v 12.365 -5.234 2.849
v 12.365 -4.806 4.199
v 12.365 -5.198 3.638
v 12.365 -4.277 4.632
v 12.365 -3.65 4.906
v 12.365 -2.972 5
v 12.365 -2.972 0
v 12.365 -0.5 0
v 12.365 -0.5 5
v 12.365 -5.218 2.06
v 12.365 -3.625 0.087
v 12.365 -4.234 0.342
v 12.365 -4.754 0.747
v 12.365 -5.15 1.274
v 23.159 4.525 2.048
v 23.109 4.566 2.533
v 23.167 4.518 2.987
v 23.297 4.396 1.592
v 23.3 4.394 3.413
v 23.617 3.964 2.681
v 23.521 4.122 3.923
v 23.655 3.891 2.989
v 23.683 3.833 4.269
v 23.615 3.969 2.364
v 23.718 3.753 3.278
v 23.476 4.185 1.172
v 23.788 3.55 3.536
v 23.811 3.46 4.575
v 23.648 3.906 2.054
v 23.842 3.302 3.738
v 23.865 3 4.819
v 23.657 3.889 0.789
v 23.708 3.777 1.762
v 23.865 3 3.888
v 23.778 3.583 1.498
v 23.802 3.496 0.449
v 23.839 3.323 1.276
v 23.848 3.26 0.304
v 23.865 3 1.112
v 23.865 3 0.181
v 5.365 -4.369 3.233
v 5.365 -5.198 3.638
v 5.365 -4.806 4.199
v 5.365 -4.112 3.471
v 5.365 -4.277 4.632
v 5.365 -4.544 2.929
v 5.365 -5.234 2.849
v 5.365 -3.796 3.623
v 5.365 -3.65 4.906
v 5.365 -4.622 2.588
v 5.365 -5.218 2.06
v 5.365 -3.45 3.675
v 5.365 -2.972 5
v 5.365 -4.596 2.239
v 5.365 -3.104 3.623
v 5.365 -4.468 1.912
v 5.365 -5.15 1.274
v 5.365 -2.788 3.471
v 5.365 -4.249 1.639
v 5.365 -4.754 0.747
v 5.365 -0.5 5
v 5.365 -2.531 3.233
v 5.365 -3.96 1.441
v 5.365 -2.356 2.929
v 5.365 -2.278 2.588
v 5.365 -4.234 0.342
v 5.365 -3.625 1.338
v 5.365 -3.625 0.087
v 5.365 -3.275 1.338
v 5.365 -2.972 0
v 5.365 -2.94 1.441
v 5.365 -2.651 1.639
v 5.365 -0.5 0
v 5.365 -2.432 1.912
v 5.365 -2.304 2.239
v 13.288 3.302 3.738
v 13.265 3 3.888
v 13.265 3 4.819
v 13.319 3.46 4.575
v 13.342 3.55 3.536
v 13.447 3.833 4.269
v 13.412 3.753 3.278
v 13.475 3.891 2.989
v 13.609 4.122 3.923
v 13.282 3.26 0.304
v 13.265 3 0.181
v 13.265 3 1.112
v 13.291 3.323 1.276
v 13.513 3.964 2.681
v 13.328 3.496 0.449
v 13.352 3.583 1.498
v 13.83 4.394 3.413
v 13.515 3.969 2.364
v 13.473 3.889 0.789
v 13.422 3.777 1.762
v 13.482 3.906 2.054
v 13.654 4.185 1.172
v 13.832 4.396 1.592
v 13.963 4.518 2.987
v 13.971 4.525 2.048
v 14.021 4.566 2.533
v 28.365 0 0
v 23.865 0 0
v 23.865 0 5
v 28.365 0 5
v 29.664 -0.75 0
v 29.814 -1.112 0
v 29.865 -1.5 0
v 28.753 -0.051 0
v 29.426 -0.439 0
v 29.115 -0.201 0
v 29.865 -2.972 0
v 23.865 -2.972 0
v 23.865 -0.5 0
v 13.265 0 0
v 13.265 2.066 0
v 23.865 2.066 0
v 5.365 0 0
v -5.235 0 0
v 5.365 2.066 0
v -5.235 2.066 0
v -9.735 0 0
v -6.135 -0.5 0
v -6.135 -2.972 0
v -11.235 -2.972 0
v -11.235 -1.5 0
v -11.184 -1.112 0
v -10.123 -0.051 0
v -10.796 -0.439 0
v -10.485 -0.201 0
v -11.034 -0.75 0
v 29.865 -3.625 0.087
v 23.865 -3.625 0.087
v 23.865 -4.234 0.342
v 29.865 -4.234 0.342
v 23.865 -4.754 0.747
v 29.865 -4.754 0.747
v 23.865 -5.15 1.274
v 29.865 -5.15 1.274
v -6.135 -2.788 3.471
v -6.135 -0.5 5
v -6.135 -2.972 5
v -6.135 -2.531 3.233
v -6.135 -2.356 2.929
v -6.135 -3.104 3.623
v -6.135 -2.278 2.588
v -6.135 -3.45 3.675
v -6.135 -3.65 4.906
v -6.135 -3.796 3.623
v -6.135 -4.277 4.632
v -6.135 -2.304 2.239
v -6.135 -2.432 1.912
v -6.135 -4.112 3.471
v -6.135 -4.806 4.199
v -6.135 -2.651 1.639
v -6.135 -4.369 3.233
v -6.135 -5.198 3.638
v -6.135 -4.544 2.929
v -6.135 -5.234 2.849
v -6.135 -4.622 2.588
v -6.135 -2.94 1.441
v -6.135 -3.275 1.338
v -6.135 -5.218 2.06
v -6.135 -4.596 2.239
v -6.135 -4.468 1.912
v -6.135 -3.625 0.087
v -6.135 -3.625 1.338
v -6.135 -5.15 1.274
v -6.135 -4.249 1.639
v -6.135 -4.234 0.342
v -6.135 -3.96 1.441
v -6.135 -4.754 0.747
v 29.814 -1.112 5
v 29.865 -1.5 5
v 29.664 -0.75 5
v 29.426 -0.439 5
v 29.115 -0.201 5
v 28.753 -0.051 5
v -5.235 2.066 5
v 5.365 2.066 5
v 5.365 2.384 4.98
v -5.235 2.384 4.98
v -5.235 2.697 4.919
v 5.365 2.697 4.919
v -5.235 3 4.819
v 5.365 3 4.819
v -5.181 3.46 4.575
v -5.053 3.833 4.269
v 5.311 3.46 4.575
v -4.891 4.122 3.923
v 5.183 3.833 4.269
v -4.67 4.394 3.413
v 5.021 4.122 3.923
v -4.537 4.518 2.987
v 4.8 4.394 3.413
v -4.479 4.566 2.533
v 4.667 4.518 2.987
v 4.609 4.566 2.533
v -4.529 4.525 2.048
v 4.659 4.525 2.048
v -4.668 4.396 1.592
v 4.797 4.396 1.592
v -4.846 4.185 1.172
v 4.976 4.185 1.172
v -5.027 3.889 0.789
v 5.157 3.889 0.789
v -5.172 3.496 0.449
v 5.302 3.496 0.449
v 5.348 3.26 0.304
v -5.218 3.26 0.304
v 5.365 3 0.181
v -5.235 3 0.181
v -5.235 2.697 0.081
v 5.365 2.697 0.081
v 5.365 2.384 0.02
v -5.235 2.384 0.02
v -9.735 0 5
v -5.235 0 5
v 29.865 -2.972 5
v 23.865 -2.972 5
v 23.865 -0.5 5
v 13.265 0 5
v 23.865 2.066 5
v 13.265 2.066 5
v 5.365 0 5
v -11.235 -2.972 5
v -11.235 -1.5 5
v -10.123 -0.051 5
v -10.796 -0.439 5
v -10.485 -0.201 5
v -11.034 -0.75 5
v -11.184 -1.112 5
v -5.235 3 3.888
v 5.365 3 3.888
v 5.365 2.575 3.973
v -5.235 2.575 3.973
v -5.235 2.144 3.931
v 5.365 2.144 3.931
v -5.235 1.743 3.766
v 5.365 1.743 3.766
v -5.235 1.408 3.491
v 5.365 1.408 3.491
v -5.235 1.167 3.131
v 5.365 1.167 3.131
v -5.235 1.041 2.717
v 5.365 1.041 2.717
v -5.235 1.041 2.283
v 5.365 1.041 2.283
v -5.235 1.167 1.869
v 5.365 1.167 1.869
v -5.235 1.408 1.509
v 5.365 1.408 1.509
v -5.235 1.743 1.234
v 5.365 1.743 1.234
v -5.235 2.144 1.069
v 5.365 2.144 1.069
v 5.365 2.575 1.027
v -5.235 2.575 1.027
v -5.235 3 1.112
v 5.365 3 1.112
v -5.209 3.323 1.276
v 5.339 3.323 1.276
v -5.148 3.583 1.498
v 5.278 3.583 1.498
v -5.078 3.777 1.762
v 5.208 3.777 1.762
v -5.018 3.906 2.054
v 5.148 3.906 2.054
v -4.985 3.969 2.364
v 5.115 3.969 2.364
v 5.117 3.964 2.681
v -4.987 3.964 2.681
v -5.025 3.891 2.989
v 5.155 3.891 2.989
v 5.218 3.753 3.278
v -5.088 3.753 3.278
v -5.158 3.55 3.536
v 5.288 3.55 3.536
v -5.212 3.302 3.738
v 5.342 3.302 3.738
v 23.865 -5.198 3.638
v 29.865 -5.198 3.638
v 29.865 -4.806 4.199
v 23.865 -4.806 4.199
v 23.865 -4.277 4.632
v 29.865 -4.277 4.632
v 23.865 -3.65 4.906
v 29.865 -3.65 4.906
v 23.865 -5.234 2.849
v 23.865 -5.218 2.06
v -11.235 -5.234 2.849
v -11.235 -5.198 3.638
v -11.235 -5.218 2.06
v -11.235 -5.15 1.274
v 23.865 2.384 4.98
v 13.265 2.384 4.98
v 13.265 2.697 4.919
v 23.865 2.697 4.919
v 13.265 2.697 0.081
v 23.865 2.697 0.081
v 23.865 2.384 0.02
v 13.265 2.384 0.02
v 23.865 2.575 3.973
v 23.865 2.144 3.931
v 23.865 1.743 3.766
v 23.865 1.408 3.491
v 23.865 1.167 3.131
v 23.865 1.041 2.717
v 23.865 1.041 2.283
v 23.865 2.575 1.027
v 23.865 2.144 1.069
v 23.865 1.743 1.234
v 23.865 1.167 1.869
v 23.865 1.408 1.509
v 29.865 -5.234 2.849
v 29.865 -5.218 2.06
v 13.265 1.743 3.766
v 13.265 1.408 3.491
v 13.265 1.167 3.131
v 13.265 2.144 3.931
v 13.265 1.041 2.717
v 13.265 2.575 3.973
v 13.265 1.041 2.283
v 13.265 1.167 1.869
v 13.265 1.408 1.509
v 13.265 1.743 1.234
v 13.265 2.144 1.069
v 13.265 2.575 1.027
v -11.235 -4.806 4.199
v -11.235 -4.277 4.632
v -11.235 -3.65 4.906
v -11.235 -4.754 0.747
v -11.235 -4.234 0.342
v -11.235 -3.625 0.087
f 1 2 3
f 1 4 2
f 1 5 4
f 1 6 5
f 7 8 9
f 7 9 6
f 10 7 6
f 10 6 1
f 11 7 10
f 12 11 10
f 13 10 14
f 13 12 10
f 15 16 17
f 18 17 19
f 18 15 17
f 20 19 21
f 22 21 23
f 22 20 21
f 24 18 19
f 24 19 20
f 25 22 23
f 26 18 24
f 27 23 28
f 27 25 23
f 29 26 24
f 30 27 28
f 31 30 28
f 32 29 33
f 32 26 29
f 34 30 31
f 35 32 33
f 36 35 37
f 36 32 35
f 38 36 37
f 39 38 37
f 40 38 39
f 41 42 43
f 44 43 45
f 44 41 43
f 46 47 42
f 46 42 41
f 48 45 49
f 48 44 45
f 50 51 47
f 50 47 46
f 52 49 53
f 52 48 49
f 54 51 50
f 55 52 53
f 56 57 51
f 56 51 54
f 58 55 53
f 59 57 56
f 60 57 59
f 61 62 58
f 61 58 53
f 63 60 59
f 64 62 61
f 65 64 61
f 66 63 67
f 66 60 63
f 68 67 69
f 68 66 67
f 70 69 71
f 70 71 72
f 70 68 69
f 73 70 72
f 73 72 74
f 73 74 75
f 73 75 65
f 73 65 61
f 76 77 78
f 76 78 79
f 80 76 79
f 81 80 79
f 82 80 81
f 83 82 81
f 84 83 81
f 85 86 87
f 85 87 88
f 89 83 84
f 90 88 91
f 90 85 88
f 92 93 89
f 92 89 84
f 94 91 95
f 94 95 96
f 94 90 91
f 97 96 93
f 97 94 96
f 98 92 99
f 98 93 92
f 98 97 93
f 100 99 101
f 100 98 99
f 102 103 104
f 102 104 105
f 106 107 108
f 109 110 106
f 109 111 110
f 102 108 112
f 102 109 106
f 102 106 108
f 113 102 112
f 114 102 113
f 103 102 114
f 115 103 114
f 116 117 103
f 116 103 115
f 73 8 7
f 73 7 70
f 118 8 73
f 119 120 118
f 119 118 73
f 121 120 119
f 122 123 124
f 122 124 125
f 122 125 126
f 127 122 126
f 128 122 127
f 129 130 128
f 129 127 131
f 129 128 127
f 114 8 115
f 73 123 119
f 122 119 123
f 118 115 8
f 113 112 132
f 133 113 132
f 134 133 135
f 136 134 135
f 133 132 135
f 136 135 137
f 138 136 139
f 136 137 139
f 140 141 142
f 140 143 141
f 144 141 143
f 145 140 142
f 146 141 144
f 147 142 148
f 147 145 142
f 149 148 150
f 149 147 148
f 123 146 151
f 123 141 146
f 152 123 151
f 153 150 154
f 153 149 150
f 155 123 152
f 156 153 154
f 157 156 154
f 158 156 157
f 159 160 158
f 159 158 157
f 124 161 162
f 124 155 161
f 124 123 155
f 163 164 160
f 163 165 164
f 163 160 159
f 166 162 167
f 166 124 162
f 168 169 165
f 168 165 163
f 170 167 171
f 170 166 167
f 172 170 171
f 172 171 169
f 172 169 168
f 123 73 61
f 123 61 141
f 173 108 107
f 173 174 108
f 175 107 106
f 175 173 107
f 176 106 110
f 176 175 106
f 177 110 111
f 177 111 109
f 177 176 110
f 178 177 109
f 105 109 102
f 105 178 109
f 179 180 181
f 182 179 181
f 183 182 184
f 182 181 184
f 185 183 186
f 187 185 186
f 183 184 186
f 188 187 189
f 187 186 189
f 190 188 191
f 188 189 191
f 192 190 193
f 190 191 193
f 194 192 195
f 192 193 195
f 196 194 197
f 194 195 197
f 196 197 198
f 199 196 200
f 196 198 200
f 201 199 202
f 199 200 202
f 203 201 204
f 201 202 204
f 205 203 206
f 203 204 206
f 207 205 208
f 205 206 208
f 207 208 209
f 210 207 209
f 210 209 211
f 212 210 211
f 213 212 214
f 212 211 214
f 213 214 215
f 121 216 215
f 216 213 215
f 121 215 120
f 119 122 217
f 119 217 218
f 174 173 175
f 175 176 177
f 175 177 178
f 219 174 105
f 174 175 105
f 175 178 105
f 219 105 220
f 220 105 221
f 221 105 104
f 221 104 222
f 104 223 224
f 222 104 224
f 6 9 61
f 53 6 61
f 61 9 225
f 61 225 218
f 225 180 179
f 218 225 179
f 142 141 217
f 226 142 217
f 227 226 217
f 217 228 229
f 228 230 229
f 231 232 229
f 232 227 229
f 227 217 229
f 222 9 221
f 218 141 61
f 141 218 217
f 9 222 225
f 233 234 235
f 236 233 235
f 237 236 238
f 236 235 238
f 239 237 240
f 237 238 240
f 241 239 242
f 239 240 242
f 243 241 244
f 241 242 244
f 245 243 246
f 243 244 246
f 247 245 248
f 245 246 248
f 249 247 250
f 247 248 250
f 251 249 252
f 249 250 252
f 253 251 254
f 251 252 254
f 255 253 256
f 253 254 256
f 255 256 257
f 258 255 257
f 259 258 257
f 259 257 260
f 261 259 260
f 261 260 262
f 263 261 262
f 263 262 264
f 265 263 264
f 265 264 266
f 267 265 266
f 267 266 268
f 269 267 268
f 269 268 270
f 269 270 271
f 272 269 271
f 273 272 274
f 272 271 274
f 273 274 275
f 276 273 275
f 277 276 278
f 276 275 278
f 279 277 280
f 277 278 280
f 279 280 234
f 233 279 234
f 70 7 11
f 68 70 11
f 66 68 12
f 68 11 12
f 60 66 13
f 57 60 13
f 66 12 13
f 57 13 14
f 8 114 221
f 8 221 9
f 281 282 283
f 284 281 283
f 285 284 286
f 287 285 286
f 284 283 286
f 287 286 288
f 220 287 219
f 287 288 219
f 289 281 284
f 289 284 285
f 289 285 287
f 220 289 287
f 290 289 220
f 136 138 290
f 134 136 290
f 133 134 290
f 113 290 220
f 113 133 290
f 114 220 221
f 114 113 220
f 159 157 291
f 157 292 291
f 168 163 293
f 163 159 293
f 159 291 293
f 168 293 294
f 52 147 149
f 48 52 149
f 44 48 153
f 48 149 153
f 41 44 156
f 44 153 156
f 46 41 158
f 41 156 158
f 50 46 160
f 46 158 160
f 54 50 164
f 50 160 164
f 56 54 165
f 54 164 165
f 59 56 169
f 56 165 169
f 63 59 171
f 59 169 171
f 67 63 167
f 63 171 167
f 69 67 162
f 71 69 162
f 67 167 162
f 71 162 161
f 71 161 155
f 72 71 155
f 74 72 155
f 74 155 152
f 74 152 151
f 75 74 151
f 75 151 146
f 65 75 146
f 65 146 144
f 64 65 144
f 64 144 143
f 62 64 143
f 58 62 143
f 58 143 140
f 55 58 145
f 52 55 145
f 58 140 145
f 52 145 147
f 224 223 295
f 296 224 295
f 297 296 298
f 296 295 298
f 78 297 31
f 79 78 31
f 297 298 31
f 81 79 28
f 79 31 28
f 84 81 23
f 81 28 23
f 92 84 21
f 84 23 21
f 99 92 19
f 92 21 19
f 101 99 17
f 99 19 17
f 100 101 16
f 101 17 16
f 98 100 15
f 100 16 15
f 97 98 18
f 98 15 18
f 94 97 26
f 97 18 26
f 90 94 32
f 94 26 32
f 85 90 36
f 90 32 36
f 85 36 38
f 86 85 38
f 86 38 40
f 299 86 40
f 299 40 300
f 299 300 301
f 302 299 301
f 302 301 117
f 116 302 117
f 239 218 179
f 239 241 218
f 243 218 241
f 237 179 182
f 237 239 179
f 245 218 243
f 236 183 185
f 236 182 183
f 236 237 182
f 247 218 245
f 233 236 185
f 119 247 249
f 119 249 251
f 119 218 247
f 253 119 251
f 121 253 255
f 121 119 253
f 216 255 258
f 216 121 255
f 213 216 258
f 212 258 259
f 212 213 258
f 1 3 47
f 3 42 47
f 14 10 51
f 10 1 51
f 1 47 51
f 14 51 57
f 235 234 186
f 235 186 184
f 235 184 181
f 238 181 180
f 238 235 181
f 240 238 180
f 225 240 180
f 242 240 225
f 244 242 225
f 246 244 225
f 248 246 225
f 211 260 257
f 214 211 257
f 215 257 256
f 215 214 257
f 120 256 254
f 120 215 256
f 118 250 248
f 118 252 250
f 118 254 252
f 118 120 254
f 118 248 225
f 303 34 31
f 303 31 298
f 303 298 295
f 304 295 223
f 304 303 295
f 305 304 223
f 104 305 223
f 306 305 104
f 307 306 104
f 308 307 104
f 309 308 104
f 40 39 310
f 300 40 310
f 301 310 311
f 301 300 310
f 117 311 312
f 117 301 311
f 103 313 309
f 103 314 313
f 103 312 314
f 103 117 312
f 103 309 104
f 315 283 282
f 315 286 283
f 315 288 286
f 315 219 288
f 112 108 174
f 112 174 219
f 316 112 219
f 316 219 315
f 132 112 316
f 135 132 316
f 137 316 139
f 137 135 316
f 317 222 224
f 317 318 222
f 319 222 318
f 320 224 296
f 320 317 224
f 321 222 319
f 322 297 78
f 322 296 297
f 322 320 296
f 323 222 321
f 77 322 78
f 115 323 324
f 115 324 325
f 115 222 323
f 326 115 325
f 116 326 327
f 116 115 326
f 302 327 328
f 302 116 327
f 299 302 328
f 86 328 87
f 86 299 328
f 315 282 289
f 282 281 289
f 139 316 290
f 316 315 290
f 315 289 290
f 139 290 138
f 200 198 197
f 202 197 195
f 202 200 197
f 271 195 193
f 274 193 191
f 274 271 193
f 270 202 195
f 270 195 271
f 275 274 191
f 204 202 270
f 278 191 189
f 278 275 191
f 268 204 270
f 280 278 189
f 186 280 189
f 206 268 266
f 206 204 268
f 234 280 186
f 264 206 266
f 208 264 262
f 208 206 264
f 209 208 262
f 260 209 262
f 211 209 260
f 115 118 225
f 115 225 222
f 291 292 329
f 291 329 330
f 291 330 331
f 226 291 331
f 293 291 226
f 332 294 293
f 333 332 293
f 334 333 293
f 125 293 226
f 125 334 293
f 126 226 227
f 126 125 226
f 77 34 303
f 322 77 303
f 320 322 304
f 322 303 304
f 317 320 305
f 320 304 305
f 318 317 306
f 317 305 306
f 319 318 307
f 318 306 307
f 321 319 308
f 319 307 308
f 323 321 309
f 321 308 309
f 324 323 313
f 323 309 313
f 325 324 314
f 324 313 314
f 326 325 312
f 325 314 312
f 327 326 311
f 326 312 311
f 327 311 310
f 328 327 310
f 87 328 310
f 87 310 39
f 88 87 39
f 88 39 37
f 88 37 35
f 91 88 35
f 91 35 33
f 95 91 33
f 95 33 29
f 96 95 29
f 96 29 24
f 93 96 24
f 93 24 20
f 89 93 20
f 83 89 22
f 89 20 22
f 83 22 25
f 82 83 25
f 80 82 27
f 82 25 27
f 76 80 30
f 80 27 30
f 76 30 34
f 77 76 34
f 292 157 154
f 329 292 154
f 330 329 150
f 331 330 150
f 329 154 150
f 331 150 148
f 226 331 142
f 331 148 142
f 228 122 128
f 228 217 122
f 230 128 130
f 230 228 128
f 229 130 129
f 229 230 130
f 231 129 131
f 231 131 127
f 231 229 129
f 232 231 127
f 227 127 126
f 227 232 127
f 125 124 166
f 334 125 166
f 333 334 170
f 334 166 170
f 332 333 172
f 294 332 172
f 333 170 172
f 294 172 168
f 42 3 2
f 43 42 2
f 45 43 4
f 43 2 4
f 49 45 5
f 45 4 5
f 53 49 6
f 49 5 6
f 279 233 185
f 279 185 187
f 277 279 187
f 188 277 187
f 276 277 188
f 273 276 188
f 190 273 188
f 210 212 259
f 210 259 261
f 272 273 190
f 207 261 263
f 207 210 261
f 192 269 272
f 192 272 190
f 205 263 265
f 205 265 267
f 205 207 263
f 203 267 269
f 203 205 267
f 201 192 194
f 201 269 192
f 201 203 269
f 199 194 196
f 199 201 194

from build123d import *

# Parameters (mm, degrees)
SALIENTE_EXTRUIR1_DEPTH     = 5
CROQUIS22_R                 = 1.475
CORTAR_EXTRUIR19_DEPTH      = 11.5
CROQUIS23_R                 = 1.475
CORTAR_EXTRUIR20_DEPTH      = 11.5
CORTAR_EXTRUIR21_DEPTH      = 36.958448256
CORTAR_EXTRUIR21_DEPTH_BACK = 36.958448256
CORTAR_EXTRUIR23_DEPTH      = 42.835511243
CORTAR_EXTRUIR23_DEPTH_BACK = 42.835511243
REDONDEO10_R                = 2.5
REDONDEO6_R                 = 1.5
CORTAR_EXTRUIR18_DEPTH      = 42.763006005
CORTAR_EXTRUIR18_DEPTH_BACK = 42.763006005
CROQUIS26_R                 = 1.175
SALIENTE_EXTRUIR2_DEPTH     = 11.5


with BuildPart() as part:
    # Croquis1 → Saliente-Extruir1 (new body)
    with BuildSketch(Plane.XY):
        with BuildLine():
            Line((-11.235063244, 0), (-5.235063244, 0))
            Line((-5.235063244, 0), (-5.235063244, 3))
            ThreePointArc((-5.235063244, 3), (-4.649276807, 4.414213562), (-3.235063244, 5))
            Line((-3.235063244, 5), (3.364936756, 5))
            ThreePointArc((3.364936756, 5), (4.779150318, 4.414213562), (5.364936756, 3))
            Line((5.364936756, 3), (5.364936756, 0))
            Line((5.364936756, 0), (13.264936756, 0))
            Line((13.264936756, 0), (13.264936756, 3))
            ThreePointArc((13.264936756, 3), (13.850723193, 4.414213562), (15.264936756, 5))
            Line((15.264936756, 5), (21.864936756, 5))
            ThreePointArc((21.864936756, 5), (23.279150318, 4.414213562), (23.864936756, 3))
            Line((23.864936756, 3), (23.864936756, 0))
            Line((23.864936756, 0), (29.864936756, 0))
            Line((29.864936756, 0), (29.864936756, -6))
            Line((29.864936756, -6), (23.864936756, -6))
            Line((23.864936756, -6), (23.864936756, -0.5))
            Line((23.864936756, -0.5), (12.364936756, -0.5))
            Line((12.364936756, -0.5), (12.364936756, -6))
            Line((12.364936756, -6), (5.364936756, -6))
            Line((5.364936756, -6), (5.364936756, -0.5))
            Line((5.364936756, -0.5), (-6.135063244, -0.5))
            Line((-6.135063244, -0.5), (-6.135063244, -6))
            Line((-6.135063244, -6), (-11.235063244, -6))
            Line((-11.235063244, -6), (-11.235063244, 0))
        make_face()
    extrude(amount=SALIENTE_EXTRUIR1_DEPTH)

    # Croquis22 → Cortar-Extruir19 (cut)
    with BuildSketch(Plane(origin=(5.364936756, 0, 0), x_dir=(0, 0, -1), z_dir=(1, 0, 0))):
        with Locations(Location((-2.5, 2.5, 0), (0, 0, 160.185071851))):
            Circle(CROQUIS22_R)
    extrude(amount=-CORTAR_EXTRUIR19_DEPTH, mode=Mode.SUBTRACT)

    # Croquis23 → Cortar-Extruir20 (cut)
    with BuildSketch(Plane(origin=(23.864936756, 0, 0), x_dir=(0, 0, -1), z_dir=(1, 0, 0))):
        with Locations(Location((-2.5, 2.5, 0), (0, 0, 160.185071851))):
            Circle(CROQUIS23_R)
    extrude(amount=-CORTAR_EXTRUIR20_DEPTH, mode=Mode.SUBTRACT)

    # Croquis24 → Cortar-Extruir21 (cut, two sides: drawn at the far end of the back side and taken through both)
    with BuildSketch(Plane(origin=(23.864936756, 0, 0), x_dir=(0, 0, -1), z_dir=(1, 0, 0)).offset(-CORTAR_EXTRUIR21_DEPTH_BACK)):
        with BuildLine():
            Line((-28.080519184, -19.184110571), (-5.642479376, 3.253929236))
            ThreePointArc((-5.642479376, 3.253929236), (-2.473578072, 4.566531134), (0.695323231, 3.253929236))
            Line((0.695323231, 3.253929236), (23.133363039, -19.184110571))
            Line((23.133363039, -19.184110571), (23.133363039, 44.280249847))
            Line((23.133363039, 44.280249847), (-28.080519184, 44.280249847))
            Line((-28.080519184, 44.280249847), (-28.080519184, -19.184110571))
        make_face()
    extrude(amount=CORTAR_EXTRUIR21_DEPTH + CORTAR_EXTRUIR21_DEPTH_BACK, mode=Mode.SUBTRACT)

    # Croquis28 → Cortar-Extruir23 (cut, two sides: drawn at the far end of the back side and taken through both)
    with BuildSketch(Plane(origin=(29.864936756, 0, 0), x_dir=(0, 0, -1), z_dir=(1, 0, 0)).offset(-CORTAR_EXTRUIR23_DEPTH_BACK)):
        with BuildLine():
            Line((-36.053555434, 5.476255779), (-5.598630977, -4.9471511))
            ThreePointArc((-5.598630977, -4.9471511), (-2.445331468, -5.471830492), (0.70796804, -4.9471511))
            Line((0.70796804, -4.9471511), (31.162892497, 5.476255779))
            Line((31.162892497, 5.476255779), (31.162892497, -58.902306946))
            Line((31.162892497, -58.902306946), (-36.053555434, -58.902306946))
            Line((-36.053555434, -58.902306946), (-36.053555434, 5.476255779))
        make_face()
    extrude(amount=CORTAR_EXTRUIR23_DEPTH + CORTAR_EXTRUIR23_DEPTH_BACK, mode=Mode.SUBTRACT)

    # Redondeo10
    # the kernel refuses this fillet: 2.5 mm, written as the material it takes off along each edge
    with BuildSketch(Plane(origin=(0.125968827, -5.13075911, 5), x_dir=(0, 1, 0), z_dir=(-1, 0, 0))) as redondeo10_piece_1:
        with BuildLine():
            CenterArc((2.159135079, 2.5), REDONDEO10_R, 180.432762449, 89.567237551)
            ThreePointArc((-0.340793609, 2.481117356), (-0.250491358, 1.229557299), (0, 0))
            Line((0, 0), (2.159135079, 0))
        make_face()
    extrude(amount=17.622064143, mode=Mode.SUBTRACT)
    with BuildSketch(Plane(origin=(0.210189755, -5.159802942, 0), x_dir=(0, 1, 0), z_dir=(-1, 0, 0))) as redondeo10_piece_2:
        with BuildLine():
            CenterArc((2.188178911, -2.5), REDONDEO10_R, 90, 90.432762449)
            ThreePointArc((-0.311749778, -2.518882644), (-0.238291712, -1.249240995), (0, 0))
            Line((0, 0), (2.188178911, 0))
        make_face()
    extrude(amount=17.790505999, mode=Mode.SUBTRACT)
    with BuildSketch(Plane(origin=(18.625968827, -5.13075911, 5), x_dir=(0, 1, 0), z_dir=(-1, 0, 0))) as redondeo10_piece_3:
        with BuildLine():
            CenterArc((2.159135079, 2.5), REDONDEO10_R, 180.432762449, 89.567237551)
            ThreePointArc((-0.340793609, 2.481117356), (-0.250491358, 1.229557299), (0, 0))
            Line((0, 0), (2.159135079, 0))
        make_face()
    extrude(amount=19.522064143, mode=Mode.SUBTRACT)
    with BuildSketch(Plane(origin=(18.710189755, -5.159802942, 0), x_dir=(0, 1, 0), z_dir=(-1, 0, 0))) as redondeo10_piece_4:
        with BuildLine():
            CenterArc((2.188178911, -2.5), REDONDEO10_R, 90, 90.432762449)
            ThreePointArc((-0.311749778, -2.518882644), (-0.238291712, -1.249240995), (0, 0))
            Line((0, 0), (2.188178911, 0))
        make_face()
    extrude(amount=19.690505999, mode=Mode.SUBTRACT)
    with BuildSketch(Plane(origin=(36.210189755, -5.159802942, 0), x_dir=(0, 1, 0), z_dir=(-1, 0, 0))) as redondeo10_piece_5:
        with BuildLine():
            CenterArc((2.188178911, -2.5), REDONDEO10_R, 90, 90.432762449)
            ThreePointArc((-0.311749778, -2.518882644), (-0.238291712, -1.249240995), (0, 0))
            Line((0, 0), (2.188178911, 0))
        make_face()
    extrude(amount=18.690505999, mode=Mode.SUBTRACT)
    with BuildSketch(Plane(origin=(36.125968827, -5.13075911, 5), x_dir=(0, 1, 0), z_dir=(-1, 0, 0))) as redondeo10_piece_6:
        with BuildLine():
            CenterArc((2.159135079, 2.5), REDONDEO10_R, 180.432762449, 89.567237551)
            ThreePointArc((-0.340793609, 2.481117356), (-0.250491358, 1.229557299), (0, 0))
            Line((0, 0), (2.159135079, 0))
        make_face()
    extrude(amount=18.522064143, mode=Mode.SUBTRACT)
    with BuildSketch(Plane(origin=(11.671123792, 3.786522656, 5), x_dir=(0, -1, 0), z_dir=(-1, 0, 0)), Plane(origin=(30.171123792, 3.786522656, 5), x_dir=(0, -1, 0), z_dir=(-1, 0, 0))) as redondeo10_piece_7:
        with BuildLine():
            CenterArc((1.720167689, -2.5), REDONDEO10_R, 90, 89.235979123)
            ThreePointArc((-0.779610048, -2.466664288), (-0.57165889, -1.175855696), (0, 0))
            Line((0, 0), (1.720167689, 0))
        make_face()
    extrude(amount=23.212374072, mode=Mode.SUBTRACT)
    with BuildSketch(Plane(origin=(11.789068224, 3.822043114, 0), x_dir=(0, -1, 0), z_dir=(-1, 0, 0)), Plane(origin=(30.289068224, 3.822043114, 0), x_dir=(0, -1, 0), z_dir=(-1, 0, 0))) as redondeo10_piece_8:
        with BuildLine():
            CenterArc((1.755688146, 2.5), REDONDEO10_R, 179.235979123, 90.764020877)
            ThreePointArc((-0.74408959, 2.533335712), (-0.562847764, 1.210625342), (0, 0))
            Line((0, 0), (1.755688146, 0))
        make_face()
    extrude(amount=23.448262936, mode=Mode.SUBTRACT)

    # Redondeo6
    redondeo6_edges = [part.edges().sort_by_distance(p)[0] for p in [
        (-11.235063244, 0, 2.5),
        (29.864936756, 0, 2.5),
    ]]
    fillet(redondeo6_edges, radius=REDONDEO6_R)

    # Croquis21 → Cortar-Extruir18 (cut, two sides: drawn at the far end of the back side and taken through both)
    with BuildSketch(Plane(origin=(29.864936756, 0, 0), x_dir=(0, 0, -1), z_dir=(1, 0, 0)).offset(-CORTAR_EXTRUIR18_DEPTH_BACK)):
        with BuildLine():
            Line((-36.990281352, 4.180822636), (-6.035224262, -4.762033155))
            ThreePointArc((-6.035224262, -4.762033155), (-2.696069768, -5.234705836), (0.643084727, -4.762033155))
            Line((0.643084727, -4.762033155), (31.598141816, 4.180822636))
            Line((31.598141816, 4.180822636), (31.598141816, -60.261096303))
            Line((31.598141816, -60.261096303), (-36.990281352, -60.261096303))
            Line((-36.990281352, -60.261096303), (-36.990281352, 4.180822636))
        make_face()
    extrude(amount=CORTAR_EXTRUIR18_DEPTH + CORTAR_EXTRUIR18_DEPTH_BACK, mode=Mode.SUBTRACT)

    # Croquis26 → Saliente-Extruir2 (add)
    with BuildSketch(Plane(origin=(-6.135063244, 0, 0), x_dir=(0, 0, -1), z_dir=(1, 0, 0))):
        with Locations(Location((-2.5, -3.45, 0), (0, 0, 180))):
            Circle(CROQUIS26_R)
    extrude(amount=SALIENTE_EXTRUIR2_DEPTH)


solid = part.part
